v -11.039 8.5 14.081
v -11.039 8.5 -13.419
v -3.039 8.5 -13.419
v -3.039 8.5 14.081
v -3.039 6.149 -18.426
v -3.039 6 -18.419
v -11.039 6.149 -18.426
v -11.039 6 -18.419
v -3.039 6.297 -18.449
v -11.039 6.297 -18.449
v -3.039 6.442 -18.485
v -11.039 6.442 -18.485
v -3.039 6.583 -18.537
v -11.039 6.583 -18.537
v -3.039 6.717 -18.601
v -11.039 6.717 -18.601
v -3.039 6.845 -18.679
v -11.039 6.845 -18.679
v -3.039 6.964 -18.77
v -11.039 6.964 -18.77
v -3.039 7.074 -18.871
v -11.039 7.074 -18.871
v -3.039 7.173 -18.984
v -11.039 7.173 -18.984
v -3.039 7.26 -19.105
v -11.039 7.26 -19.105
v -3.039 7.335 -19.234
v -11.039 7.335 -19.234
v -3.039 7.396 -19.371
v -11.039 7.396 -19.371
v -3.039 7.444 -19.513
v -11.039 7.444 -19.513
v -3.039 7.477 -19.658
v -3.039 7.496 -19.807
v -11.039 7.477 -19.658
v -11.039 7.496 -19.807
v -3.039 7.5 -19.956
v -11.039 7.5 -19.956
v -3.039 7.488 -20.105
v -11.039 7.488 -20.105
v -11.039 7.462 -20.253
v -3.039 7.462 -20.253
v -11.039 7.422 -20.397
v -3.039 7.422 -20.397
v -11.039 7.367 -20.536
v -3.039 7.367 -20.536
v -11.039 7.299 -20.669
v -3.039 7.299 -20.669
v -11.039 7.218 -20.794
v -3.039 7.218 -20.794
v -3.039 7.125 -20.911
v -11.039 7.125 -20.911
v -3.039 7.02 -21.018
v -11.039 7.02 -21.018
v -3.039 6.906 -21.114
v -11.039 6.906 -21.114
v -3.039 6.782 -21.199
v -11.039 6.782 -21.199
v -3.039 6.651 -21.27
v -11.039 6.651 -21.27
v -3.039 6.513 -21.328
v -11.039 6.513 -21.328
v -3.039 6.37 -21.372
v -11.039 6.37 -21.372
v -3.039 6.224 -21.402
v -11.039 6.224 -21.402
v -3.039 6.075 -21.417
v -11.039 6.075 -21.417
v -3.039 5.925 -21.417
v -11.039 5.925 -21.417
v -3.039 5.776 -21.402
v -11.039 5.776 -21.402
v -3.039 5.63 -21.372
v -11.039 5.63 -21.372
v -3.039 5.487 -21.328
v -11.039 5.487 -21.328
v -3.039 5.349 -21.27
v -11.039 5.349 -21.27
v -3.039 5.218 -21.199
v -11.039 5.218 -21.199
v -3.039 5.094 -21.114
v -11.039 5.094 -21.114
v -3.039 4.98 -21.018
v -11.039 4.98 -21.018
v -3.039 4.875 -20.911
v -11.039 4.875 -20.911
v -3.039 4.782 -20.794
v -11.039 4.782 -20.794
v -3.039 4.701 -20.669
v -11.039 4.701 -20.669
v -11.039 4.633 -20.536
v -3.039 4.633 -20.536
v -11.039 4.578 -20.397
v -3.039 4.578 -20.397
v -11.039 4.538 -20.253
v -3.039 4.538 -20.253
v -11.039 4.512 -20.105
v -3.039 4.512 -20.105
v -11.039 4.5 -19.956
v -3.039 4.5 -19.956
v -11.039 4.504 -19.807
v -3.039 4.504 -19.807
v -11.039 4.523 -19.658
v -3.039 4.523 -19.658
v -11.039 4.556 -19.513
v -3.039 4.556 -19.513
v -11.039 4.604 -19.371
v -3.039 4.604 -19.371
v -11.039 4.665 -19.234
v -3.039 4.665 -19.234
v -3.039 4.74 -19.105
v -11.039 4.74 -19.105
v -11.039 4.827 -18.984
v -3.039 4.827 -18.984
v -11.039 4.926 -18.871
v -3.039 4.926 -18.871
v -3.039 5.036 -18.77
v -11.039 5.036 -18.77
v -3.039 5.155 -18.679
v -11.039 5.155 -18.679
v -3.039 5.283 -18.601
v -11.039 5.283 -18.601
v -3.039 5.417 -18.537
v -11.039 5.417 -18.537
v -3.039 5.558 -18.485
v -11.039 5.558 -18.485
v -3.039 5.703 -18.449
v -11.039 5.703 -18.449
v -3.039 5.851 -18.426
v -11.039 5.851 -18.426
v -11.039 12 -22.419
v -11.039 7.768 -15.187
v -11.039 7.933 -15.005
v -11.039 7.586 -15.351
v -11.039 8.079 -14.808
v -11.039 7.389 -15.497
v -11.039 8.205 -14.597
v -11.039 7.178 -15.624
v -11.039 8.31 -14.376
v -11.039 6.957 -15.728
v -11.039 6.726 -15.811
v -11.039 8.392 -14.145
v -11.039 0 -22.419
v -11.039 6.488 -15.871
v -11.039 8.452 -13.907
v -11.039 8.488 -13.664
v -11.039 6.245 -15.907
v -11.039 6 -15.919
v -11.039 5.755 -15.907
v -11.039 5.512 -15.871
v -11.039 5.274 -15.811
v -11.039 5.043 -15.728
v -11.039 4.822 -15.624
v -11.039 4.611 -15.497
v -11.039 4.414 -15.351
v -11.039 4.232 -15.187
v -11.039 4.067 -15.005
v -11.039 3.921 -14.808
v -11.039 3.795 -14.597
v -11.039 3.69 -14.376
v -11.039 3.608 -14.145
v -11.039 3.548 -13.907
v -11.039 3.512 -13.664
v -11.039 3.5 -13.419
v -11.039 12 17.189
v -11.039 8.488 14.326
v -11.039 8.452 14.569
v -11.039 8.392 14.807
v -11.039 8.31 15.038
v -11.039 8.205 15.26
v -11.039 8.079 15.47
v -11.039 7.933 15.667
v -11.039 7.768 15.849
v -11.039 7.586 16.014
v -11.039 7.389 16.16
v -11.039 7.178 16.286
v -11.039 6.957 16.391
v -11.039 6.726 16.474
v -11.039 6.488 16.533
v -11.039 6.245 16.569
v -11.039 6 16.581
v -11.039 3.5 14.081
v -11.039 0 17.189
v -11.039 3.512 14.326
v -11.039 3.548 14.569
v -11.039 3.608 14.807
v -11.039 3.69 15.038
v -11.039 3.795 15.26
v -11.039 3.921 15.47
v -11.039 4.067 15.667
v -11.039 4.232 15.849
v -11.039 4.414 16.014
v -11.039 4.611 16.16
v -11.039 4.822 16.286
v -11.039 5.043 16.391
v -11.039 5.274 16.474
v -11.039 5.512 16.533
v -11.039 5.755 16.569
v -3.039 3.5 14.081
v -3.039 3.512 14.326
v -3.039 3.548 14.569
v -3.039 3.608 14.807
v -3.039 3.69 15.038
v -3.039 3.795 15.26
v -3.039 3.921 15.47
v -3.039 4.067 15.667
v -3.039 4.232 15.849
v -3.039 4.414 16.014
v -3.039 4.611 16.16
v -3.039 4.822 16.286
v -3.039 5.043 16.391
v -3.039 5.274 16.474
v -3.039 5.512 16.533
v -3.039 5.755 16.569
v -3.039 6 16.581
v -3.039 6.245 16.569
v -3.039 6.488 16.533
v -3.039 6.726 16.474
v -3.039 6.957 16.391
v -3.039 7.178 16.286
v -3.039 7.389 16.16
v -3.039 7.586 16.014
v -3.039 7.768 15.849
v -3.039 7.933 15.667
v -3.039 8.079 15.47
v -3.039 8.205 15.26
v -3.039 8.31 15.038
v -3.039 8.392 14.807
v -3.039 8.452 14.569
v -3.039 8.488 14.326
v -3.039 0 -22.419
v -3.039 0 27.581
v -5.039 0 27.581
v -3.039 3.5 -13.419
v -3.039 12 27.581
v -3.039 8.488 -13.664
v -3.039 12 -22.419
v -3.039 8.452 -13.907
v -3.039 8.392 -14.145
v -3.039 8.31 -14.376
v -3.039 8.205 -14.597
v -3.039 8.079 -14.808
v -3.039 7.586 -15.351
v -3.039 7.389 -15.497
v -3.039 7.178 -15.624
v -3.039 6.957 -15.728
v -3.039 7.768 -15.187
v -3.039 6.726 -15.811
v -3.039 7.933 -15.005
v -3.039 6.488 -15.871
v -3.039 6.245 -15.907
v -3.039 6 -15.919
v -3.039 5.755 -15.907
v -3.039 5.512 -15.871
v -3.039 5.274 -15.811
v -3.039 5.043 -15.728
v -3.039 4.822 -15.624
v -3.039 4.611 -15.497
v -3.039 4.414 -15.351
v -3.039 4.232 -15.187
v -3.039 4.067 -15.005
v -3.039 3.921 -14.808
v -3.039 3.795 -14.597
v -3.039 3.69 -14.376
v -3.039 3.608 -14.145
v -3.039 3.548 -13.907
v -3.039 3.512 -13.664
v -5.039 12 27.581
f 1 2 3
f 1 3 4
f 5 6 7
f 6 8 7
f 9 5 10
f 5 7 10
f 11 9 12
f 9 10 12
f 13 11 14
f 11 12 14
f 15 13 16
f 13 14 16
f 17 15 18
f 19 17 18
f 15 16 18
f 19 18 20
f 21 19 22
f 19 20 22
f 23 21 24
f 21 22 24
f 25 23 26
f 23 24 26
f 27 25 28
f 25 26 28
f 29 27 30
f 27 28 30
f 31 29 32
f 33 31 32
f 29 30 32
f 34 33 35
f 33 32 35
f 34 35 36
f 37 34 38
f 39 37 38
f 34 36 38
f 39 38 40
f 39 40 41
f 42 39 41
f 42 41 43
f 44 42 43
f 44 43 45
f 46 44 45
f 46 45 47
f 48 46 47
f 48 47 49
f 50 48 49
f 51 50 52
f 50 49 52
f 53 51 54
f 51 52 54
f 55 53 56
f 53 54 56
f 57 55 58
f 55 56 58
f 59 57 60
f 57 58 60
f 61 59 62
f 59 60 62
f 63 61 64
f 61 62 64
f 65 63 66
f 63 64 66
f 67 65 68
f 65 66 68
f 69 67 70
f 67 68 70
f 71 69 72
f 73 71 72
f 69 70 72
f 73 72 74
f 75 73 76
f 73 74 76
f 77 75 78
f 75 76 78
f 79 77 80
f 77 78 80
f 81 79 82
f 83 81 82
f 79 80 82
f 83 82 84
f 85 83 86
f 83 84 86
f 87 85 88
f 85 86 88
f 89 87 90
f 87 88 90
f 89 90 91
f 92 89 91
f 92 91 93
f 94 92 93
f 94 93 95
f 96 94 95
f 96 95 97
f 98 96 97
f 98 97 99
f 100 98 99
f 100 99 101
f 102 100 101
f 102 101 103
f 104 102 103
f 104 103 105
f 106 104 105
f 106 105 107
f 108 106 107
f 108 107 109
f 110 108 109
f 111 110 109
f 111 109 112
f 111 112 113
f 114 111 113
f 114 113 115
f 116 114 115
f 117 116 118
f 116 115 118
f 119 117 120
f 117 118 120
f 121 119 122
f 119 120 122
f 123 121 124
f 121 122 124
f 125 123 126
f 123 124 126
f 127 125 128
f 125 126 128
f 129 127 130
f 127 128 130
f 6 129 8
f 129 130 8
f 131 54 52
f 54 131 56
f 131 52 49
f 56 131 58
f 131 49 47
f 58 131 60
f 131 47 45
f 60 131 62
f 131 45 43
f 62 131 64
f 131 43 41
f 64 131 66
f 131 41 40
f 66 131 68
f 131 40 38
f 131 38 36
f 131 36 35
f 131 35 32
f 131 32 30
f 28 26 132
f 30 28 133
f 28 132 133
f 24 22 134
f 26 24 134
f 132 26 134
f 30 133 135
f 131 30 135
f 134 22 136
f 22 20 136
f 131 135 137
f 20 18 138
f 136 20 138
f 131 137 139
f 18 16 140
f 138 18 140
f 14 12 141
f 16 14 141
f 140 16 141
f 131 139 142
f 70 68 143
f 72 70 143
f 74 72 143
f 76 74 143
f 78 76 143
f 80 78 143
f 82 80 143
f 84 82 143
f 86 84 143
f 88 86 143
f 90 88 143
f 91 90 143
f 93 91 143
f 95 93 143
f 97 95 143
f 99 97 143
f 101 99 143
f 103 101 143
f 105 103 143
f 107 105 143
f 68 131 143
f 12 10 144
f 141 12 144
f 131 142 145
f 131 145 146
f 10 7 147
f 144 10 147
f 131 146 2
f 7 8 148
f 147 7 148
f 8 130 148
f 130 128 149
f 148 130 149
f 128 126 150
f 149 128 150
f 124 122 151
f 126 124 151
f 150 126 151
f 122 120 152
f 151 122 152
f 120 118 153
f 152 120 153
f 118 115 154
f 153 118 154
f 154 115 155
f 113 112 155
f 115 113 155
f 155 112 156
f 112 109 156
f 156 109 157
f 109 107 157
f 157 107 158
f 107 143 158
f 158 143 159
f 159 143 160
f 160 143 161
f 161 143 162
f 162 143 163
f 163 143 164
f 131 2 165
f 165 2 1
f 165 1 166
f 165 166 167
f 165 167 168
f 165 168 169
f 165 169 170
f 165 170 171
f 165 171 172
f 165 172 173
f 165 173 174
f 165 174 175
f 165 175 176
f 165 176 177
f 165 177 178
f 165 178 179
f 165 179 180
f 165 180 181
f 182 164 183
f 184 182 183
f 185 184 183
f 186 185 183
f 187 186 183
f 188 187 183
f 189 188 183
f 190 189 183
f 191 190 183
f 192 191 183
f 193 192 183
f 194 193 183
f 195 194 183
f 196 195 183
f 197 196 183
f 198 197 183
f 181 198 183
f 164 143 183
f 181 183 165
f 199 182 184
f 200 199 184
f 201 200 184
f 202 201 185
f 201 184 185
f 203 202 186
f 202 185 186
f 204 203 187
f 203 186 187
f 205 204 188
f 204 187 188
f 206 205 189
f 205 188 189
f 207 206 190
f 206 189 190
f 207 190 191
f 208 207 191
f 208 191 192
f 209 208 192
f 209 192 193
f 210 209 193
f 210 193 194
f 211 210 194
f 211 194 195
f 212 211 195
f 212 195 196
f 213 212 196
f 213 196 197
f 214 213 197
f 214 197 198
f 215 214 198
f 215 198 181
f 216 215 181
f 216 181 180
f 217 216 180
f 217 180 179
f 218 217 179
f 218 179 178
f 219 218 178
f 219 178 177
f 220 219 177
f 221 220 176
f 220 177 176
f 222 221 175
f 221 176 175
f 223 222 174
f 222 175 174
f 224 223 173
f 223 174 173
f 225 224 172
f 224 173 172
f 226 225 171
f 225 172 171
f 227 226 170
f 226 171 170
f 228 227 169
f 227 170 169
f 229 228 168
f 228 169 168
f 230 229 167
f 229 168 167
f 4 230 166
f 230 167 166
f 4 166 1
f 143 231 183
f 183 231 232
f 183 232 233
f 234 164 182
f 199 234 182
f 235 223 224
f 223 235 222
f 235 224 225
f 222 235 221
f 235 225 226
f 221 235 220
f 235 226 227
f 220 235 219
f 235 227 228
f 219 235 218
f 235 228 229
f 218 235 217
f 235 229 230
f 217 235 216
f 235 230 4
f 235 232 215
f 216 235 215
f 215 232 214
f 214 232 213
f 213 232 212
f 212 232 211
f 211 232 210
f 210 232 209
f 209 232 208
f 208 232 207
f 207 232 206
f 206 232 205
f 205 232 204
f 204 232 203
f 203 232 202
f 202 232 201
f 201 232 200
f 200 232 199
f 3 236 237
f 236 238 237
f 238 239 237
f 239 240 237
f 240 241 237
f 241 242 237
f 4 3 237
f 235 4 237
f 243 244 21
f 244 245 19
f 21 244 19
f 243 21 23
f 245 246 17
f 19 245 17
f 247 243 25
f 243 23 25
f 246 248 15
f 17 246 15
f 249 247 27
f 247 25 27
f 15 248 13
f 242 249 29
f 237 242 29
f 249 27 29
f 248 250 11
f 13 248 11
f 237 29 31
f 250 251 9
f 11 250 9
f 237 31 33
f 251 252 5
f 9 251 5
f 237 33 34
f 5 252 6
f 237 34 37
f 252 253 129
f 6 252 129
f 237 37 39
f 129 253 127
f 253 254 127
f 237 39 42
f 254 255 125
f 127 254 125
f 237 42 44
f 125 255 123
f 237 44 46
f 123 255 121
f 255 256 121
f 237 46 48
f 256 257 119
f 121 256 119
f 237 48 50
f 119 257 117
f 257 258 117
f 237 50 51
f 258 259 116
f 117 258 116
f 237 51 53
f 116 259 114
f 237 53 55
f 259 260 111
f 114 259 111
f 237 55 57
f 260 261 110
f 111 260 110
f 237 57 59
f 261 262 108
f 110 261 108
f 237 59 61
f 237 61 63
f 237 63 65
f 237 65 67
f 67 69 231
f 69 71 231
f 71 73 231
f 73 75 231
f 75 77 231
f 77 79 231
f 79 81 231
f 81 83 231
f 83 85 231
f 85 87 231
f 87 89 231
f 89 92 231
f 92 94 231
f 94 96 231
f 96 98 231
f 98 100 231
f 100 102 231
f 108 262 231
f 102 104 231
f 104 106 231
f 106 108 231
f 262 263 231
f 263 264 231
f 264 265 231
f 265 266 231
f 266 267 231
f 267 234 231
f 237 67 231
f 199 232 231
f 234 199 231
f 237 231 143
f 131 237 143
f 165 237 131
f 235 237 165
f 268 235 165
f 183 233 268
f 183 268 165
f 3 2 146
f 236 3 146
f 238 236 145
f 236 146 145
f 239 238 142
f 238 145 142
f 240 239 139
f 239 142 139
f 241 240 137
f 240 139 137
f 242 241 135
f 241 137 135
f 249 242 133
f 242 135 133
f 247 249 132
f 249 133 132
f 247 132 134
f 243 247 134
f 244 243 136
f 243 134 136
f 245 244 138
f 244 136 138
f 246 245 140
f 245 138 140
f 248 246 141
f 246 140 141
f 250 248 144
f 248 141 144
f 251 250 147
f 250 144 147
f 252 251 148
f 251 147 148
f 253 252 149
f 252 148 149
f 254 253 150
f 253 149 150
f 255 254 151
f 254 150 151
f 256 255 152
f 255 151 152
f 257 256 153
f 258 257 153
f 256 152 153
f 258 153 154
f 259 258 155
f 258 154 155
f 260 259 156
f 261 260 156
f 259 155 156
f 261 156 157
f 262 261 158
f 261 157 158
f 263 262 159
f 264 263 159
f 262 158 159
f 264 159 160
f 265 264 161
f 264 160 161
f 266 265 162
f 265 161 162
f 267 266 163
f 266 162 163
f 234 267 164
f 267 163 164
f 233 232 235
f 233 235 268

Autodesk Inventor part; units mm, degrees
ref_plane "YZ Plane" through (0, 0, 0) normal (1, 0, 0) x (0, 1, 0)
ref_plane "XZ Plane" through (0, 0, 0) normal (0, 1, 0) x (-1, 0, 0)
ref_plane "XY Plane" through (0, 0, 0) normal (0, 0, 1) x (1, 0, 0)
sketch "Boceto1" plane through (0, 0, 0) normal (0, 1, 0) x (-1, 0, 0)
  line L0 (3.0387, 27.5812) -> (3.0387, -22.4188)
  line L1 (3.0387, -22.4188) -> (11.0387, -22.4188)
  line L2 (11.0387, -22.4188) -> (11.0387, 17.1889)
  line L3 (3.0387, 27.5812) -> (5.0387, 27.5812)
  line L4 (5.0387, 27.5812) -> (11.0387, 17.1889)
  dimension "d0" = 50
  dimension "d1" = 8
  dimension "d3" = 2
  dimension "d69" = 30
extrude "Extrusión1" add sketch "Boceto1" along normal blind 12
sketch "Boceto3" plane through (-11.0387, 0, -22.4188) normal (-1, 0, 0) x (0, 0, 1)
  line L0 (0, 0) -> (0, 12) projected
  line L1 (39.6077, 0) -> (39.6077, 12) projected
  line L2 (0, 12) -> (39.6077, 12) projected
  circle A0 centre (2.5, 6) radius 1.5
  line L3 (9, 3.5) -> (36.5, 3.5)
  line L4 (9, 8.5) -> (36.5, 8.5)
  line L5 (0, 0) -> (39.6077, 0) projected
  arc A1 (9, 8.5) -> (9, 3.5) centre (9, 6) ccw
  circle A2 centre (9, 6) radius 4.5
  circle A3 centre (36.5, 6) radius 2.5
  dimension "d51" = 3
  dimension "d52" = 2.5
  dimension "d56" = 27.5
  dimension "d63" = 5
  dimension "d64" = 9
  dimension "d65" = 27.5
  dimension "d66" = 9
extrude "Extrusión6" cut sketch "Boceto3" against normal blind 10 contours A0 | A1 L4 A2 L3 | A2 L4 A3 L3 | A3 picked at (10.5, 6)
thread "Thread1" size "M3x0.5" class "6H" standard "ISO Metric profile" length 98
properties part number "Chaponete" material "Steel, High Strength, Low Alloy"
